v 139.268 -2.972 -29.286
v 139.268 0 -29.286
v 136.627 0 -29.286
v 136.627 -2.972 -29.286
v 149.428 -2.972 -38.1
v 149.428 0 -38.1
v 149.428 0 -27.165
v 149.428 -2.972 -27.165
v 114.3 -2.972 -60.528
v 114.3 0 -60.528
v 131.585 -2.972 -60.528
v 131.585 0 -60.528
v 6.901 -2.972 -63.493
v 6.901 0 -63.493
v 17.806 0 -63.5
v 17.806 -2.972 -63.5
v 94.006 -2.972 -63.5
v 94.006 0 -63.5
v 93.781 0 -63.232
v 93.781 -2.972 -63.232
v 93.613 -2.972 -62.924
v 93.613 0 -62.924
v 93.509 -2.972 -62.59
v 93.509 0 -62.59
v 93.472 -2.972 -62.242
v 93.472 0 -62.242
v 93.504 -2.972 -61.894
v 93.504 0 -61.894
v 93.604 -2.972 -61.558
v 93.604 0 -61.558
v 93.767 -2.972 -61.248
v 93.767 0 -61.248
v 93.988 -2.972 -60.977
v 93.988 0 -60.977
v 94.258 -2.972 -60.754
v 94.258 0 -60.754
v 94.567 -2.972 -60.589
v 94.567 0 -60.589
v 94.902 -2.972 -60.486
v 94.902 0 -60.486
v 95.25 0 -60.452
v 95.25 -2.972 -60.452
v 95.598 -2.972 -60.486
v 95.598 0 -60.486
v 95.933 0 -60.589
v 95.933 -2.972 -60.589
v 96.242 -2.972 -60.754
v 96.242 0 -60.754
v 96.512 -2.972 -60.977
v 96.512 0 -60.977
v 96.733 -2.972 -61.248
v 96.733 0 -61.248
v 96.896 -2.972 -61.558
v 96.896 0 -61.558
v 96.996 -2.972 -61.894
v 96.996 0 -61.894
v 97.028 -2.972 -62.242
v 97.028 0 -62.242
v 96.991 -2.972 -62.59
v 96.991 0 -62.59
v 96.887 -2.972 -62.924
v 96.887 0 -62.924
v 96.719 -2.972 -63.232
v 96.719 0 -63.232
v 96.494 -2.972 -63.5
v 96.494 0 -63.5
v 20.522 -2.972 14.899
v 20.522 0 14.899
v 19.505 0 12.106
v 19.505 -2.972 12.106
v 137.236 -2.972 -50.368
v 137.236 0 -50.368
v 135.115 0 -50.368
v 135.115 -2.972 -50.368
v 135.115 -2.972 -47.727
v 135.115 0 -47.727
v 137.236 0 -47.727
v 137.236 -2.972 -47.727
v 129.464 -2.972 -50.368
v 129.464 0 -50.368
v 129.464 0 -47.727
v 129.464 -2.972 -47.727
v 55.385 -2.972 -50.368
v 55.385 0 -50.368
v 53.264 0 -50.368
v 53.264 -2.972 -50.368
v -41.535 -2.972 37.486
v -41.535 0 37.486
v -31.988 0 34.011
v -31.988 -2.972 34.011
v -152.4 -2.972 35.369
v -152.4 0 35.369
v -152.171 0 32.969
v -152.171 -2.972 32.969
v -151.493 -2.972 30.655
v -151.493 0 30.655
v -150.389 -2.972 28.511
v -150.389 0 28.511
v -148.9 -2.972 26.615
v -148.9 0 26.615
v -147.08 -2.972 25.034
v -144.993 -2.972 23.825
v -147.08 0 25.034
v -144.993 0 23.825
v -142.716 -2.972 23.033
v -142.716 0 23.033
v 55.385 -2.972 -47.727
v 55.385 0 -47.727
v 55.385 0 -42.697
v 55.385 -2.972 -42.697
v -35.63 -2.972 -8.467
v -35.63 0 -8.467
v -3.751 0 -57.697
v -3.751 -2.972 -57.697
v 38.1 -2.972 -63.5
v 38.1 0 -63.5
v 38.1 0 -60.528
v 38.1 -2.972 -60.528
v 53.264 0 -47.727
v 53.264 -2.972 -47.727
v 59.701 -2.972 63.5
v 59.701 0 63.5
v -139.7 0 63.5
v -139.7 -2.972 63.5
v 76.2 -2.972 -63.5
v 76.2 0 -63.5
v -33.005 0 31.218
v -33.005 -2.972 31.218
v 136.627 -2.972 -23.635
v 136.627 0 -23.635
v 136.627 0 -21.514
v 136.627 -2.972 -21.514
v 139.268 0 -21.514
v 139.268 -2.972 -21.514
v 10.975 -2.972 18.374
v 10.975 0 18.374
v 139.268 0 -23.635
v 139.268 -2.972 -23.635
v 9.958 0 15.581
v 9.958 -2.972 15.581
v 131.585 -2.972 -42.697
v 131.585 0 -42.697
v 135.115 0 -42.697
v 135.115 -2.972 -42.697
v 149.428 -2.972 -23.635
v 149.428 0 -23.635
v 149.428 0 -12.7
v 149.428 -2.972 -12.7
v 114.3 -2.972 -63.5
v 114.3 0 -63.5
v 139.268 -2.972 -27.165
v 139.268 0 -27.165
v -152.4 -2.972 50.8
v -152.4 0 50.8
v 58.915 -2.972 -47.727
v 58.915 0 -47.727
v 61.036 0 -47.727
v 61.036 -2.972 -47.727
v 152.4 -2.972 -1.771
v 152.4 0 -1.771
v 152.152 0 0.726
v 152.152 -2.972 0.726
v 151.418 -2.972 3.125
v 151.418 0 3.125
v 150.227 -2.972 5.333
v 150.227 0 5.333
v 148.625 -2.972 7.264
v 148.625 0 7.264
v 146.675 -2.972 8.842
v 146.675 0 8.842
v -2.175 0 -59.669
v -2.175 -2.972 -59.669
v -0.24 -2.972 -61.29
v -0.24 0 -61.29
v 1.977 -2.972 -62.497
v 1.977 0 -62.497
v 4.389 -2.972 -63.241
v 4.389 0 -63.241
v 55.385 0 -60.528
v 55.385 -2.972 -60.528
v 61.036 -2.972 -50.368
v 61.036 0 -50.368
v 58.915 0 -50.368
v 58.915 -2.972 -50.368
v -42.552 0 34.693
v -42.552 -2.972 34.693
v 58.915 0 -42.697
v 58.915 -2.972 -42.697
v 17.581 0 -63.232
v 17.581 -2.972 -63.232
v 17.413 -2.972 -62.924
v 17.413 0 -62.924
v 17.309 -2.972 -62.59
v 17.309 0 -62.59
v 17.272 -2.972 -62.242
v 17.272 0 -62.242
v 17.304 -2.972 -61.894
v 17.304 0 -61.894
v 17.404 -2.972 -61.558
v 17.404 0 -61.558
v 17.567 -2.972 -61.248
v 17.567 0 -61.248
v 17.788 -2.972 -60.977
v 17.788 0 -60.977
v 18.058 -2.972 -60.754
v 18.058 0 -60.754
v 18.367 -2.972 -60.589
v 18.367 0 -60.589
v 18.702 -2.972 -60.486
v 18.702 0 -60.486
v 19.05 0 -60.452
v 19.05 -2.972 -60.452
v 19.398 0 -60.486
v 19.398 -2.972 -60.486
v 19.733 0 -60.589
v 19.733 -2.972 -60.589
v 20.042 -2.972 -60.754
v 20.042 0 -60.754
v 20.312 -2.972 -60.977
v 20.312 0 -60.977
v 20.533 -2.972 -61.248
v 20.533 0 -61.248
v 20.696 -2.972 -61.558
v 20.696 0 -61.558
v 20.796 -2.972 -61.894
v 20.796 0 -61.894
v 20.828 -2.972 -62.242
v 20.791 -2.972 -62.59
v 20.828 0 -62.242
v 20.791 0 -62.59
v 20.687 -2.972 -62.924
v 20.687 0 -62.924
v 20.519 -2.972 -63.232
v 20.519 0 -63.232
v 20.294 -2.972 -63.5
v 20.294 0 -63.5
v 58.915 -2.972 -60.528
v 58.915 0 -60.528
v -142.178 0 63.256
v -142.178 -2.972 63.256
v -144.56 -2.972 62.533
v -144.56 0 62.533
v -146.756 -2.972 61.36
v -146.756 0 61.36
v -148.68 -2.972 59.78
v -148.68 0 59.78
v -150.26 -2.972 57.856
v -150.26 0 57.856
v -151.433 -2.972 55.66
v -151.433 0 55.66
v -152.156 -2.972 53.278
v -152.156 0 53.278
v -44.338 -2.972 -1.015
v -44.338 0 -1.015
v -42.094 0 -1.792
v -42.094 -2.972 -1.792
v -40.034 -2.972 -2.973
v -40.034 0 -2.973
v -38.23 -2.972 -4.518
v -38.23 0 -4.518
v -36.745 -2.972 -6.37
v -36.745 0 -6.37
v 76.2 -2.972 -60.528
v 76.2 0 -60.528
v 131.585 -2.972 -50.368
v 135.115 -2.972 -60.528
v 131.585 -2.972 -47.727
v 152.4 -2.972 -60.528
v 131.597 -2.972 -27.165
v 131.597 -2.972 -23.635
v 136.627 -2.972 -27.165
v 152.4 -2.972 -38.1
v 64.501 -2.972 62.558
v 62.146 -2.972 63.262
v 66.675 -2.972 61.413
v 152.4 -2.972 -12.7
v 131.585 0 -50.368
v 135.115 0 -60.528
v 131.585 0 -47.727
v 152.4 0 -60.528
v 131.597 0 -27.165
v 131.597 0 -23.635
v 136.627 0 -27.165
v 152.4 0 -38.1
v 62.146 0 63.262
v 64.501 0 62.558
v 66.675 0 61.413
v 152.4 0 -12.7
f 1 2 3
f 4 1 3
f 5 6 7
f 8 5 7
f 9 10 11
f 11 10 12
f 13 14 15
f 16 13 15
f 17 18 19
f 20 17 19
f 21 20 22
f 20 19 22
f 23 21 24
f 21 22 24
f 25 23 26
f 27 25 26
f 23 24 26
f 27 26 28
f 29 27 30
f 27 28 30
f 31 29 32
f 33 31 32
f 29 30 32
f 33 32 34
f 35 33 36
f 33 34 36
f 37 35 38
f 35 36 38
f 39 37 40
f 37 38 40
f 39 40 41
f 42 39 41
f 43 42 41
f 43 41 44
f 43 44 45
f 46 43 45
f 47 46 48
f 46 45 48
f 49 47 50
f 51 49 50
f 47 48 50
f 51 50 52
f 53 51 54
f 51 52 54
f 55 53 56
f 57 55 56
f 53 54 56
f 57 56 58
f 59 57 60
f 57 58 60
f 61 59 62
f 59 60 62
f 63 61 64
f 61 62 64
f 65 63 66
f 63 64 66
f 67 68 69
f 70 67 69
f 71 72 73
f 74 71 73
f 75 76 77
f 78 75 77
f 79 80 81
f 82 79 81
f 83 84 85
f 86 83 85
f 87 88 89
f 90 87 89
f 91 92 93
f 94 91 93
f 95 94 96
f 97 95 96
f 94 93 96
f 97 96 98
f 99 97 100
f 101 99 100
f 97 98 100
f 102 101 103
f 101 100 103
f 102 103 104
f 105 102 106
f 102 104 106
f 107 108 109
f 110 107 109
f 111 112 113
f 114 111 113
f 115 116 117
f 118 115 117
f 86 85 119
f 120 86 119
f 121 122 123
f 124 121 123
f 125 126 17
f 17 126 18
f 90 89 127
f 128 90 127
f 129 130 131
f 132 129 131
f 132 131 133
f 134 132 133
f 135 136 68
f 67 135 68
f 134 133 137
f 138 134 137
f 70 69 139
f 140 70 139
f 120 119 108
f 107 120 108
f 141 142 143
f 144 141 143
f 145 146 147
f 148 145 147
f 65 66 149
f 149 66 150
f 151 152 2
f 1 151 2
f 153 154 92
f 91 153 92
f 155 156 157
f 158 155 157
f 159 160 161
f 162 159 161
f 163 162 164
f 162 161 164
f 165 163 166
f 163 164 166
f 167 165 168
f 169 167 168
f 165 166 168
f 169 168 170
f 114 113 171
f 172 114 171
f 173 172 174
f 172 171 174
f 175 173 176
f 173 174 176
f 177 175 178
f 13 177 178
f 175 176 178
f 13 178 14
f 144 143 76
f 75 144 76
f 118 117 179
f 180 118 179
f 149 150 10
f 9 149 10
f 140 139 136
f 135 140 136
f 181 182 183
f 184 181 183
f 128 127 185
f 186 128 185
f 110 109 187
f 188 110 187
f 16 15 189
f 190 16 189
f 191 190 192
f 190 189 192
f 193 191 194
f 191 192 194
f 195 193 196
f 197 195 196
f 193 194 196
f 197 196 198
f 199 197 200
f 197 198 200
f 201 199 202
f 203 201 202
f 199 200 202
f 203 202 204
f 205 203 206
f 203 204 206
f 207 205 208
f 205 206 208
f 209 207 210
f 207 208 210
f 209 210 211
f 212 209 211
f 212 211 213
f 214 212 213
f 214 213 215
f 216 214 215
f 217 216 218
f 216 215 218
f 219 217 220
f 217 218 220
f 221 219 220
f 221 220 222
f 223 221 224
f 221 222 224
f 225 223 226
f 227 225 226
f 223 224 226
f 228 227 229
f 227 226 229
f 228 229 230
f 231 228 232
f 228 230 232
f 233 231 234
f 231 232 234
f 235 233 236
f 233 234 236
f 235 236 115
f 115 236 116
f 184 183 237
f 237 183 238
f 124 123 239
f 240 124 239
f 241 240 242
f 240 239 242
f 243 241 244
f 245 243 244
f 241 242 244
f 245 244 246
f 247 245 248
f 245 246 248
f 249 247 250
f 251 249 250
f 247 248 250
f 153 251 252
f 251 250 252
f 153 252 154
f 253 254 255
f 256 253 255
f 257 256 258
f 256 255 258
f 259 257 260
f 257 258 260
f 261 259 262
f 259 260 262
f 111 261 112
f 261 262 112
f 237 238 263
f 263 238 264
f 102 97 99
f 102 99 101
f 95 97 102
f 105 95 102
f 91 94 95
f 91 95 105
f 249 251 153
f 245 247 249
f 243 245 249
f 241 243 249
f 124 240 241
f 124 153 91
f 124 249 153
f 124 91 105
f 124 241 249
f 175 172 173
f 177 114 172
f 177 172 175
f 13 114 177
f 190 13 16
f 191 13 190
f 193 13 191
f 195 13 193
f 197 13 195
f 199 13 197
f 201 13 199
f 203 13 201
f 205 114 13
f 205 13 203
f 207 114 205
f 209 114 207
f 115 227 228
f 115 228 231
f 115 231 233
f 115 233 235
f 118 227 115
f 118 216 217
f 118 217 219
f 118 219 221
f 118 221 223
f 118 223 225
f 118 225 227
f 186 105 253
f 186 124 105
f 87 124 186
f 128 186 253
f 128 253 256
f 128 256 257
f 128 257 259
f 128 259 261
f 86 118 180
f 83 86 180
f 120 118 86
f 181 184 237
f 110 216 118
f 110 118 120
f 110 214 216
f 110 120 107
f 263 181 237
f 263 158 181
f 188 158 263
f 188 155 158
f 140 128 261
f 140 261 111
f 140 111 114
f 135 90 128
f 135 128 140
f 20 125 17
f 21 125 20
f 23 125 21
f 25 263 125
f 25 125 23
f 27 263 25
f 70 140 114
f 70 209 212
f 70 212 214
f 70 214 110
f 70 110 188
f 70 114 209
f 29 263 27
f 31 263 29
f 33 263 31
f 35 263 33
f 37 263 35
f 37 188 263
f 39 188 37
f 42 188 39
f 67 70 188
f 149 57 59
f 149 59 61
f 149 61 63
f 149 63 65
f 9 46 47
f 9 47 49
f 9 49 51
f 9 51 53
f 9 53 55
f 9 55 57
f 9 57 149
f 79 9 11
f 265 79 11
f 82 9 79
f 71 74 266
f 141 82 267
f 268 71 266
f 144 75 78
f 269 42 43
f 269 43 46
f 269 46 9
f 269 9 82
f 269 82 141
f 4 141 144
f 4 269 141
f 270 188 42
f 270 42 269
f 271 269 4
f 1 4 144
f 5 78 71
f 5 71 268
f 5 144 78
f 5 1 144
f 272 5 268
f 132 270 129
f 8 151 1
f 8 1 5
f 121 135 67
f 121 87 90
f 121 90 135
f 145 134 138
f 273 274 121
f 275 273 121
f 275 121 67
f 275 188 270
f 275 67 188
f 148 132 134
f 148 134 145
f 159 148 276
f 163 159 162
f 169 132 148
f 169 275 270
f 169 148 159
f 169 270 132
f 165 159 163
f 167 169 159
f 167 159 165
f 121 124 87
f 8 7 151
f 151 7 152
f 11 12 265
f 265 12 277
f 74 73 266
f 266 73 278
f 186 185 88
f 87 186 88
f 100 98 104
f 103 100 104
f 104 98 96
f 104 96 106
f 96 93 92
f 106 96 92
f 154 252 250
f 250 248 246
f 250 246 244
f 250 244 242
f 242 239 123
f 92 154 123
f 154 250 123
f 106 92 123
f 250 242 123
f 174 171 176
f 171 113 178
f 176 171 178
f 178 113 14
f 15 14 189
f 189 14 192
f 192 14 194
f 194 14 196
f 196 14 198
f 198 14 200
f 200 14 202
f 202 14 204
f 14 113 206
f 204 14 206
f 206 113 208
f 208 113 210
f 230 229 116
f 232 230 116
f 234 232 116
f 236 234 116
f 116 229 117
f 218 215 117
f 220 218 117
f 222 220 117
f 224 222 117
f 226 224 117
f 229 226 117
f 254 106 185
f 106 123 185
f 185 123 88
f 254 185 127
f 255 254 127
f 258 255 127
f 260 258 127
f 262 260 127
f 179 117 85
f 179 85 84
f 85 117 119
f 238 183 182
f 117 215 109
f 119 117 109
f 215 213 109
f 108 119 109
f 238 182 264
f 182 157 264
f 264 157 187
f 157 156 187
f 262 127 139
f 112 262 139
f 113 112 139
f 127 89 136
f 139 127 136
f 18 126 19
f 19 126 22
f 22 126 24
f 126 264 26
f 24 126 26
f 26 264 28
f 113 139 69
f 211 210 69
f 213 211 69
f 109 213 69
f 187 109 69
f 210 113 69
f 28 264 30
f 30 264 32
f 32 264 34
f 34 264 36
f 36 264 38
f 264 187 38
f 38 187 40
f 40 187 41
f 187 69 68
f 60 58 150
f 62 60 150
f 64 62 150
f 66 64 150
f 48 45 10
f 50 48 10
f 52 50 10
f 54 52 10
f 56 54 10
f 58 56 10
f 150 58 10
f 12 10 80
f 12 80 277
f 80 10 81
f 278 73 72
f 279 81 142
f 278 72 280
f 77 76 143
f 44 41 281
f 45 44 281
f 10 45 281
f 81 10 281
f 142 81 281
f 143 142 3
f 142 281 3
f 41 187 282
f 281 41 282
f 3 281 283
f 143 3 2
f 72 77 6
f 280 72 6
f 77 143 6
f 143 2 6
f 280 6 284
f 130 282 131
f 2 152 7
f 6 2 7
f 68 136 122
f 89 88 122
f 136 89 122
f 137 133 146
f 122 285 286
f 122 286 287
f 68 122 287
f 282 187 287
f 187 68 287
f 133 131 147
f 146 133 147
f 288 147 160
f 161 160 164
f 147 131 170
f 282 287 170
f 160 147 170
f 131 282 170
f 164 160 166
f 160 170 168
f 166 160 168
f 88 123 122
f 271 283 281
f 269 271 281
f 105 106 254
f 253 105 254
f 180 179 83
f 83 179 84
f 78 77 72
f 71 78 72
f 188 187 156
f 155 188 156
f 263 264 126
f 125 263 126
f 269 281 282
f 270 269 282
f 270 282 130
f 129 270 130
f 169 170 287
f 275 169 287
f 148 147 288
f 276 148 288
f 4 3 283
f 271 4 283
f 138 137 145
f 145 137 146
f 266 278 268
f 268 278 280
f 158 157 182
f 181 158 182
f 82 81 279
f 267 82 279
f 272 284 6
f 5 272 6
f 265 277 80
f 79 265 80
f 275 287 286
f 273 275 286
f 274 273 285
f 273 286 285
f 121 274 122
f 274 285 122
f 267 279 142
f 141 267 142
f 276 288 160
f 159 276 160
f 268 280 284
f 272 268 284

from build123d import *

# Parameters (mm, degrees)
F1_DEPTH = 2.9718


with BuildPart() as f1:
    # F0 (on Front) → F1 (new body)
    with BuildSketch(Plane.XZ):
        with BuildLine():
            Line((135.1153, -60.5282), (152.4, -60.5282))
            Line((152.4, -60.5282), (152.4, -38.1))
            Line((152.4, -38.1), (149.4282, -38.1))
            Line((149.4282, -38.1), (149.4282, -27.1653))
            Line((149.4282, -27.1653), (139.2682, -27.1653))
            Line((139.2682, -27.1653), (139.2682, -29.2862))
            Line((139.2682, -29.2862), (136.6266, -29.2862))
            Line((136.6266, -29.2862), (136.6266, -27.1653))
            Line((136.6266, -27.1653), (131.5974, -27.1653))
            Line((131.5974, -27.1653), (131.5974, -23.6347))
            Line((131.5974, -23.6347), (136.6266, -23.6347))
            Line((136.6266, -23.6347), (136.6266, -21.5138))
            Line((136.6266, -21.5138), (139.2682, -21.5138))
            Line((139.2682, -21.5138), (139.2682, -23.6347))
            Line((139.2682, -23.6347), (149.4282, -23.6347))
            Line((149.4282, -23.6347), (149.4282, -12.7))
            Line((149.4282, -12.7), (152.4, -12.7))
            Line((152.4, -12.7), (152.4, -1.771027))
            ThreePointArc((152.4, -1.771027), (150.877363, 4.258612), (146.674559, 8.842433))
            Line((146.674559, 8.842433), (66.67517, 61.41346))
            ThreePointArc((66.67517, 61.41346), (63.340602, 62.967188), (59.700611, 63.5))
            Line((59.700611, 63.5), (-139.7, 63.5))
            ThreePointArc((-139.7, 63.5), (-148.680256, 59.780256), (-152.4, 50.8))
            Line((-152.4, 50.8), (-152.4, 35.369483))
            ThreePointArc((-152.4, 35.369483), (-149.689715, 27.52757), (-142.715654, 23.032715))
            Line((-142.715654, 23.032715), (-44.337678, -1.015234))
            ThreePointArc((-44.337678, -1.015234), (-39.095537, -3.703229), (-35.630256, -8.467386))
            Line((-35.630256, -8.467386), (-3.751196, -57.696563))
            ThreePointArc((-3.751196, -57.696563), (0.838391, -61.948701), (6.901284, -63.493472))
            Line((6.901284, -63.493472), (17.805659, -63.5))
            ThreePointArc((17.805659, -63.5), (19.05, -60.452), (20.294341, -63.5))
            Line((20.294341, -63.5), (38.1, -63.5))
            Line((38.1, -63.5), (38.1, -60.5282))
            Line((38.1, -60.5282), (55.3847, -60.5282))
            Line((55.3847, -60.5282), (55.3847, -50.3682))
            Line((55.3847, -50.3682), (53.2638, -50.3682))
            Line((53.2638, -50.3682), (53.2638, -47.7266))
            Line((53.2638, -47.7266), (55.3847, -47.7266))
            Line((55.3847, -47.7266), (55.3847, -42.6974))
            Line((55.3847, -42.6974), (58.9153, -42.6974))
            Line((58.9153, -42.6974), (58.9153, -47.7266))
            Line((58.9153, -47.7266), (61.0362, -47.7266))
            Line((61.0362, -47.7266), (61.0362, -50.3682))
            Line((61.0362, -50.3682), (58.9153, -50.3682))
            Line((58.9153, -50.3682), (58.9153, -60.5282))
            Line((58.9153, -60.5282), (76.2, -60.5282))
            Line((76.2, -60.5282), (76.2, -63.5))
            Line((76.2, -63.5), (94.005659, -63.5))
            ThreePointArc((94.005659, -63.5), (95.25, -60.452), (96.494341, -63.5))
            Line((96.494341, -63.5), (114.3, -63.5))
            Line((114.3, -63.5), (114.3, -60.5282))
            Line((114.3, -60.5282), (131.5847, -60.5282))
            Line((131.5847, -60.5282), (131.5847, -50.3682))
            Line((131.5847, -50.3682), (129.4638, -50.3682))
            Line((129.4638, -50.3682), (129.4638, -47.7266))
            Line((129.4638, -47.7266), (131.5847, -47.7266))
            Line((131.5847, -47.7266), (131.5847, -42.6974))
            Line((131.5847, -42.6974), (135.1153, -42.6974))
            Line((135.1153, -42.6974), (135.1153, -47.7266))
            Line((135.1153, -47.7266), (137.2362, -47.7266))
            Line((137.2362, -47.7266), (137.2362, -50.3682))
            Line((137.2362, -50.3682), (135.1153, -50.3682))
            Line((135.1153, -50.3682), (135.1153, -60.5282))
        make_face()
        Polygon((-31.988177, 34.010913), (-33.004593, 31.218334), (-42.55187, 34.693259), (-41.535454, 37.485837), align=None, mode=Mode.SUBTRACT)
        Polygon((20.521846, 14.898827), (19.505431, 12.106248), (9.958154, 15.581173), (10.974569, 18.373752), align=None, mode=Mode.SUBTRACT)
    extrude(amount=F1_DEPTH)


solid = f1.part
